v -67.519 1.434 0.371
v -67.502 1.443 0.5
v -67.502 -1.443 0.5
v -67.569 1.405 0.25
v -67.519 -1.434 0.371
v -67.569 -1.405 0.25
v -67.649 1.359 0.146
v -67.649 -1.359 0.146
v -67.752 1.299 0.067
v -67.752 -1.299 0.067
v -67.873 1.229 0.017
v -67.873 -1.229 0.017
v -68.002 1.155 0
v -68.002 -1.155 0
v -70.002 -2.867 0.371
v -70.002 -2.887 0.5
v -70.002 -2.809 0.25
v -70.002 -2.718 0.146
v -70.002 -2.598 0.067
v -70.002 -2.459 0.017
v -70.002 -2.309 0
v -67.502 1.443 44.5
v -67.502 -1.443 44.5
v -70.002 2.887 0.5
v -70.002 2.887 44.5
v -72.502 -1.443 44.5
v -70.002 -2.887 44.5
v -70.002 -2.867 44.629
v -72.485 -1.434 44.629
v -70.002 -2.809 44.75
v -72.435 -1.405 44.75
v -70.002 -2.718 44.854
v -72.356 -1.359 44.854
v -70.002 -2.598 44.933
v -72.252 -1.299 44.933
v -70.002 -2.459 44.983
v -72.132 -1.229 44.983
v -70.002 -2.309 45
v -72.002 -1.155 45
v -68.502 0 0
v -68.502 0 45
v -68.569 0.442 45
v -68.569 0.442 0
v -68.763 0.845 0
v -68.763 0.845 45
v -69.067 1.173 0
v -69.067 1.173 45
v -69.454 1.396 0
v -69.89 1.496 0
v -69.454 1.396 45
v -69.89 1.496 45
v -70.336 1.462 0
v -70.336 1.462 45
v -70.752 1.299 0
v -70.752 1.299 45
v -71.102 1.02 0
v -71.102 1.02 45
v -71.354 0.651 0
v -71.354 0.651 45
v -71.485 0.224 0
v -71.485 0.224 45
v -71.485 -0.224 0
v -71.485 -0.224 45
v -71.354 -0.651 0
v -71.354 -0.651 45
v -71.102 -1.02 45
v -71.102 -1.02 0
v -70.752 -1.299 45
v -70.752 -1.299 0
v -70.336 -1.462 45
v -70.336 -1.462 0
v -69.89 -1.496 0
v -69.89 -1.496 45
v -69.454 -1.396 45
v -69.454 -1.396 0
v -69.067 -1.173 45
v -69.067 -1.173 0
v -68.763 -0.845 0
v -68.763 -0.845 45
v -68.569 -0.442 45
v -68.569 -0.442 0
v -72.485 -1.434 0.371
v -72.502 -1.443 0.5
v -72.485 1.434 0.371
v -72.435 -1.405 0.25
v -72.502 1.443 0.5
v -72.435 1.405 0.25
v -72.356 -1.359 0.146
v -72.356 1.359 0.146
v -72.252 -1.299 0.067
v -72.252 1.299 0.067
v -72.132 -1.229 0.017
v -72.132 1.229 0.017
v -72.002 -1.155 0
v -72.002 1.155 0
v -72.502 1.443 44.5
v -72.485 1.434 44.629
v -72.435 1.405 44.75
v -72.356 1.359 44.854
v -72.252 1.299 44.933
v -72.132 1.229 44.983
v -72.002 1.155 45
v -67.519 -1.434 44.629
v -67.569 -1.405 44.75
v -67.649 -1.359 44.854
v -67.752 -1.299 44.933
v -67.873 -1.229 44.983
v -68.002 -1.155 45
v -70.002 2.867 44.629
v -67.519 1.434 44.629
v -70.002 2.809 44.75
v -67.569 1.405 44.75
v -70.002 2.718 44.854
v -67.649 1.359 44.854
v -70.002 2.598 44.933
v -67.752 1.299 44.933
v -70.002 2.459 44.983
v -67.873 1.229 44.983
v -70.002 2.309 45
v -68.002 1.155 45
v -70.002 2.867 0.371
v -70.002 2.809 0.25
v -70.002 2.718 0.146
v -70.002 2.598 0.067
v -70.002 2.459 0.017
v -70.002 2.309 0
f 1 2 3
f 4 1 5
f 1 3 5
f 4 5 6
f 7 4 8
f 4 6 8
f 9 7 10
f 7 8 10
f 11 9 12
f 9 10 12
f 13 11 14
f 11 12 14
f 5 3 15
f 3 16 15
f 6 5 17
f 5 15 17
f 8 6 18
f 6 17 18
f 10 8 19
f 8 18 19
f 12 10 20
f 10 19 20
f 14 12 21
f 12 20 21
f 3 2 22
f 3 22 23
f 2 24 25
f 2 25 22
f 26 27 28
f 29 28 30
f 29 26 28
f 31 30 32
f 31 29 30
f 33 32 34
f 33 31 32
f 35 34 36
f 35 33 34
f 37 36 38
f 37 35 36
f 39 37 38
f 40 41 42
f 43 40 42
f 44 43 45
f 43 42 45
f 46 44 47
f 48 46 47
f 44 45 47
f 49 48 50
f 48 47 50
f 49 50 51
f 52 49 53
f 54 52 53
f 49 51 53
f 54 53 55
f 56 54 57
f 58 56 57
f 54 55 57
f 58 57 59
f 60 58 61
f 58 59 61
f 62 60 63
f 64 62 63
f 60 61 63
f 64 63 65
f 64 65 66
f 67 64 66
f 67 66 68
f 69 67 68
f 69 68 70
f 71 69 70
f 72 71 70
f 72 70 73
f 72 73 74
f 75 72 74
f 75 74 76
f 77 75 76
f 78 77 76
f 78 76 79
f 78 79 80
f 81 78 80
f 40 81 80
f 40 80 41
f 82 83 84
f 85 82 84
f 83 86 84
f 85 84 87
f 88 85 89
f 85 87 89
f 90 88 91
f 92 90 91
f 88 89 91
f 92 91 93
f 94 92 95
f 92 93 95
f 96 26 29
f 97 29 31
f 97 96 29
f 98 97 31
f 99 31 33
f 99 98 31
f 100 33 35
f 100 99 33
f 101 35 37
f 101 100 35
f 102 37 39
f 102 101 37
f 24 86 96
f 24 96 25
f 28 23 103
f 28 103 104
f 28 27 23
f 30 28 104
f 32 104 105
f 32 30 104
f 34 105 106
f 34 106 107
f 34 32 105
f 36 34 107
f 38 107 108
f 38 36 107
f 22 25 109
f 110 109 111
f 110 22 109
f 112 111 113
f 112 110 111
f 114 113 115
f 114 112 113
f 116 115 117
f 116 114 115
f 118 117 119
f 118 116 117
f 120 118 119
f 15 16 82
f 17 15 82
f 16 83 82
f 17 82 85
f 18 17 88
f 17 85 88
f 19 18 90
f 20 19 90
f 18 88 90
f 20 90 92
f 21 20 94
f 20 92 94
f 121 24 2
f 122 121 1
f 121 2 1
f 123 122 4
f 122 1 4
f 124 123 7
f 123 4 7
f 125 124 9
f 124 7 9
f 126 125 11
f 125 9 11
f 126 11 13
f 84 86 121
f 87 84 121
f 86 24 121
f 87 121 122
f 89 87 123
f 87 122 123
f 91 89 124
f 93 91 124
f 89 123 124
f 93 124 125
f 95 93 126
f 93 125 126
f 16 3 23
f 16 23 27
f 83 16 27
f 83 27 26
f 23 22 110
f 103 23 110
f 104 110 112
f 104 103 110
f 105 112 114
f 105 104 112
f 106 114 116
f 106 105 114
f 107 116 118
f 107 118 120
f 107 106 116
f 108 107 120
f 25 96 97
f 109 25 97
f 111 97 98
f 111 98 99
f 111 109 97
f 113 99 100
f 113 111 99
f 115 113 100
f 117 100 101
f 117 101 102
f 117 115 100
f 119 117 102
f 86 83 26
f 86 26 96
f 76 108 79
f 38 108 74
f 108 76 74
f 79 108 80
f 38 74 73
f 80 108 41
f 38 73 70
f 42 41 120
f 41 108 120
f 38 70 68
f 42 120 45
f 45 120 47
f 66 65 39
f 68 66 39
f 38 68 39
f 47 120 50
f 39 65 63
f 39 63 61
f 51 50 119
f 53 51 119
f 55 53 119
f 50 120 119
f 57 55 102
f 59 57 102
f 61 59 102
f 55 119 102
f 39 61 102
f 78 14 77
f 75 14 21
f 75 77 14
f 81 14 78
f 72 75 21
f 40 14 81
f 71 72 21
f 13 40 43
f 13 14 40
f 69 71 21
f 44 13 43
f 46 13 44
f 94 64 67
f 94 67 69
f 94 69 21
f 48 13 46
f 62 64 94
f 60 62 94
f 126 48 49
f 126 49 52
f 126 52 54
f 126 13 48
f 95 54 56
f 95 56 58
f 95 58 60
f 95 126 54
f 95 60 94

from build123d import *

# Parameters (mm, degrees)
RESSALTO_EXTRUS_O1_DEPTH = 45
FILETE1_R                = 0.5
ESBO_O2_R                = 1.5
CORTE_EXTRUS_O1_DEPTH    = 46


with BuildPart() as part:
    # Esboço1 → Ressalto-extrusão1 (new body)
    with BuildSketch(Plane(origin=(0, 0, 0), x_dir=(-1, 0, 0), z_dir=(0, 0, -1))):
        Polygon((67.502122675, -1.443375673), (70.002122675, -2.886751346), (72.502122675, -1.443375673), (72.502122675, 1.443375673), (70.002122675, 2.886751346), (67.502122675, 1.443375673), align=None)
    extrude(amount=-RESSALTO_EXTRUS_O1_DEPTH)

    # Filete1
    filete1_edges = [part.edges().sort_by_distance(p)[0] for p in [
        (-71.252122675, -2.165063509, 45),
        (-72.502122675, 0, 45),
        (-71.252122675, 2.165063509, 45),
        (-68.752122675, 2.165063509, 45),
        (-67.502122675, 0, 45),
        (-68.752122675, 2.165063509, 0),
        (-71.252122675, 2.165063509, 0),
        (-72.502122675, 0, 0),
        (-71.252122675, -2.165063509, 0),
        (-68.752122675, -2.165063509, 0),
        (-67.502122675, 0, 0),
        (-68.752122675, -2.165063509, 45),
    ]]
    fillet(filete1_edges, radius=FILETE1_R)

    # Esboço2 → Corte-extrusão1 (cut, through all)
    with BuildSketch(Plane.XY.offset(45)):
        with Locations((-70.002122675, 0)):
            Circle(ESBO_O2_R)
    extrude(amount=-CORTE_EXTRUS_O1_DEPTH, mode=Mode.SUBTRACT)


solid = part.part
